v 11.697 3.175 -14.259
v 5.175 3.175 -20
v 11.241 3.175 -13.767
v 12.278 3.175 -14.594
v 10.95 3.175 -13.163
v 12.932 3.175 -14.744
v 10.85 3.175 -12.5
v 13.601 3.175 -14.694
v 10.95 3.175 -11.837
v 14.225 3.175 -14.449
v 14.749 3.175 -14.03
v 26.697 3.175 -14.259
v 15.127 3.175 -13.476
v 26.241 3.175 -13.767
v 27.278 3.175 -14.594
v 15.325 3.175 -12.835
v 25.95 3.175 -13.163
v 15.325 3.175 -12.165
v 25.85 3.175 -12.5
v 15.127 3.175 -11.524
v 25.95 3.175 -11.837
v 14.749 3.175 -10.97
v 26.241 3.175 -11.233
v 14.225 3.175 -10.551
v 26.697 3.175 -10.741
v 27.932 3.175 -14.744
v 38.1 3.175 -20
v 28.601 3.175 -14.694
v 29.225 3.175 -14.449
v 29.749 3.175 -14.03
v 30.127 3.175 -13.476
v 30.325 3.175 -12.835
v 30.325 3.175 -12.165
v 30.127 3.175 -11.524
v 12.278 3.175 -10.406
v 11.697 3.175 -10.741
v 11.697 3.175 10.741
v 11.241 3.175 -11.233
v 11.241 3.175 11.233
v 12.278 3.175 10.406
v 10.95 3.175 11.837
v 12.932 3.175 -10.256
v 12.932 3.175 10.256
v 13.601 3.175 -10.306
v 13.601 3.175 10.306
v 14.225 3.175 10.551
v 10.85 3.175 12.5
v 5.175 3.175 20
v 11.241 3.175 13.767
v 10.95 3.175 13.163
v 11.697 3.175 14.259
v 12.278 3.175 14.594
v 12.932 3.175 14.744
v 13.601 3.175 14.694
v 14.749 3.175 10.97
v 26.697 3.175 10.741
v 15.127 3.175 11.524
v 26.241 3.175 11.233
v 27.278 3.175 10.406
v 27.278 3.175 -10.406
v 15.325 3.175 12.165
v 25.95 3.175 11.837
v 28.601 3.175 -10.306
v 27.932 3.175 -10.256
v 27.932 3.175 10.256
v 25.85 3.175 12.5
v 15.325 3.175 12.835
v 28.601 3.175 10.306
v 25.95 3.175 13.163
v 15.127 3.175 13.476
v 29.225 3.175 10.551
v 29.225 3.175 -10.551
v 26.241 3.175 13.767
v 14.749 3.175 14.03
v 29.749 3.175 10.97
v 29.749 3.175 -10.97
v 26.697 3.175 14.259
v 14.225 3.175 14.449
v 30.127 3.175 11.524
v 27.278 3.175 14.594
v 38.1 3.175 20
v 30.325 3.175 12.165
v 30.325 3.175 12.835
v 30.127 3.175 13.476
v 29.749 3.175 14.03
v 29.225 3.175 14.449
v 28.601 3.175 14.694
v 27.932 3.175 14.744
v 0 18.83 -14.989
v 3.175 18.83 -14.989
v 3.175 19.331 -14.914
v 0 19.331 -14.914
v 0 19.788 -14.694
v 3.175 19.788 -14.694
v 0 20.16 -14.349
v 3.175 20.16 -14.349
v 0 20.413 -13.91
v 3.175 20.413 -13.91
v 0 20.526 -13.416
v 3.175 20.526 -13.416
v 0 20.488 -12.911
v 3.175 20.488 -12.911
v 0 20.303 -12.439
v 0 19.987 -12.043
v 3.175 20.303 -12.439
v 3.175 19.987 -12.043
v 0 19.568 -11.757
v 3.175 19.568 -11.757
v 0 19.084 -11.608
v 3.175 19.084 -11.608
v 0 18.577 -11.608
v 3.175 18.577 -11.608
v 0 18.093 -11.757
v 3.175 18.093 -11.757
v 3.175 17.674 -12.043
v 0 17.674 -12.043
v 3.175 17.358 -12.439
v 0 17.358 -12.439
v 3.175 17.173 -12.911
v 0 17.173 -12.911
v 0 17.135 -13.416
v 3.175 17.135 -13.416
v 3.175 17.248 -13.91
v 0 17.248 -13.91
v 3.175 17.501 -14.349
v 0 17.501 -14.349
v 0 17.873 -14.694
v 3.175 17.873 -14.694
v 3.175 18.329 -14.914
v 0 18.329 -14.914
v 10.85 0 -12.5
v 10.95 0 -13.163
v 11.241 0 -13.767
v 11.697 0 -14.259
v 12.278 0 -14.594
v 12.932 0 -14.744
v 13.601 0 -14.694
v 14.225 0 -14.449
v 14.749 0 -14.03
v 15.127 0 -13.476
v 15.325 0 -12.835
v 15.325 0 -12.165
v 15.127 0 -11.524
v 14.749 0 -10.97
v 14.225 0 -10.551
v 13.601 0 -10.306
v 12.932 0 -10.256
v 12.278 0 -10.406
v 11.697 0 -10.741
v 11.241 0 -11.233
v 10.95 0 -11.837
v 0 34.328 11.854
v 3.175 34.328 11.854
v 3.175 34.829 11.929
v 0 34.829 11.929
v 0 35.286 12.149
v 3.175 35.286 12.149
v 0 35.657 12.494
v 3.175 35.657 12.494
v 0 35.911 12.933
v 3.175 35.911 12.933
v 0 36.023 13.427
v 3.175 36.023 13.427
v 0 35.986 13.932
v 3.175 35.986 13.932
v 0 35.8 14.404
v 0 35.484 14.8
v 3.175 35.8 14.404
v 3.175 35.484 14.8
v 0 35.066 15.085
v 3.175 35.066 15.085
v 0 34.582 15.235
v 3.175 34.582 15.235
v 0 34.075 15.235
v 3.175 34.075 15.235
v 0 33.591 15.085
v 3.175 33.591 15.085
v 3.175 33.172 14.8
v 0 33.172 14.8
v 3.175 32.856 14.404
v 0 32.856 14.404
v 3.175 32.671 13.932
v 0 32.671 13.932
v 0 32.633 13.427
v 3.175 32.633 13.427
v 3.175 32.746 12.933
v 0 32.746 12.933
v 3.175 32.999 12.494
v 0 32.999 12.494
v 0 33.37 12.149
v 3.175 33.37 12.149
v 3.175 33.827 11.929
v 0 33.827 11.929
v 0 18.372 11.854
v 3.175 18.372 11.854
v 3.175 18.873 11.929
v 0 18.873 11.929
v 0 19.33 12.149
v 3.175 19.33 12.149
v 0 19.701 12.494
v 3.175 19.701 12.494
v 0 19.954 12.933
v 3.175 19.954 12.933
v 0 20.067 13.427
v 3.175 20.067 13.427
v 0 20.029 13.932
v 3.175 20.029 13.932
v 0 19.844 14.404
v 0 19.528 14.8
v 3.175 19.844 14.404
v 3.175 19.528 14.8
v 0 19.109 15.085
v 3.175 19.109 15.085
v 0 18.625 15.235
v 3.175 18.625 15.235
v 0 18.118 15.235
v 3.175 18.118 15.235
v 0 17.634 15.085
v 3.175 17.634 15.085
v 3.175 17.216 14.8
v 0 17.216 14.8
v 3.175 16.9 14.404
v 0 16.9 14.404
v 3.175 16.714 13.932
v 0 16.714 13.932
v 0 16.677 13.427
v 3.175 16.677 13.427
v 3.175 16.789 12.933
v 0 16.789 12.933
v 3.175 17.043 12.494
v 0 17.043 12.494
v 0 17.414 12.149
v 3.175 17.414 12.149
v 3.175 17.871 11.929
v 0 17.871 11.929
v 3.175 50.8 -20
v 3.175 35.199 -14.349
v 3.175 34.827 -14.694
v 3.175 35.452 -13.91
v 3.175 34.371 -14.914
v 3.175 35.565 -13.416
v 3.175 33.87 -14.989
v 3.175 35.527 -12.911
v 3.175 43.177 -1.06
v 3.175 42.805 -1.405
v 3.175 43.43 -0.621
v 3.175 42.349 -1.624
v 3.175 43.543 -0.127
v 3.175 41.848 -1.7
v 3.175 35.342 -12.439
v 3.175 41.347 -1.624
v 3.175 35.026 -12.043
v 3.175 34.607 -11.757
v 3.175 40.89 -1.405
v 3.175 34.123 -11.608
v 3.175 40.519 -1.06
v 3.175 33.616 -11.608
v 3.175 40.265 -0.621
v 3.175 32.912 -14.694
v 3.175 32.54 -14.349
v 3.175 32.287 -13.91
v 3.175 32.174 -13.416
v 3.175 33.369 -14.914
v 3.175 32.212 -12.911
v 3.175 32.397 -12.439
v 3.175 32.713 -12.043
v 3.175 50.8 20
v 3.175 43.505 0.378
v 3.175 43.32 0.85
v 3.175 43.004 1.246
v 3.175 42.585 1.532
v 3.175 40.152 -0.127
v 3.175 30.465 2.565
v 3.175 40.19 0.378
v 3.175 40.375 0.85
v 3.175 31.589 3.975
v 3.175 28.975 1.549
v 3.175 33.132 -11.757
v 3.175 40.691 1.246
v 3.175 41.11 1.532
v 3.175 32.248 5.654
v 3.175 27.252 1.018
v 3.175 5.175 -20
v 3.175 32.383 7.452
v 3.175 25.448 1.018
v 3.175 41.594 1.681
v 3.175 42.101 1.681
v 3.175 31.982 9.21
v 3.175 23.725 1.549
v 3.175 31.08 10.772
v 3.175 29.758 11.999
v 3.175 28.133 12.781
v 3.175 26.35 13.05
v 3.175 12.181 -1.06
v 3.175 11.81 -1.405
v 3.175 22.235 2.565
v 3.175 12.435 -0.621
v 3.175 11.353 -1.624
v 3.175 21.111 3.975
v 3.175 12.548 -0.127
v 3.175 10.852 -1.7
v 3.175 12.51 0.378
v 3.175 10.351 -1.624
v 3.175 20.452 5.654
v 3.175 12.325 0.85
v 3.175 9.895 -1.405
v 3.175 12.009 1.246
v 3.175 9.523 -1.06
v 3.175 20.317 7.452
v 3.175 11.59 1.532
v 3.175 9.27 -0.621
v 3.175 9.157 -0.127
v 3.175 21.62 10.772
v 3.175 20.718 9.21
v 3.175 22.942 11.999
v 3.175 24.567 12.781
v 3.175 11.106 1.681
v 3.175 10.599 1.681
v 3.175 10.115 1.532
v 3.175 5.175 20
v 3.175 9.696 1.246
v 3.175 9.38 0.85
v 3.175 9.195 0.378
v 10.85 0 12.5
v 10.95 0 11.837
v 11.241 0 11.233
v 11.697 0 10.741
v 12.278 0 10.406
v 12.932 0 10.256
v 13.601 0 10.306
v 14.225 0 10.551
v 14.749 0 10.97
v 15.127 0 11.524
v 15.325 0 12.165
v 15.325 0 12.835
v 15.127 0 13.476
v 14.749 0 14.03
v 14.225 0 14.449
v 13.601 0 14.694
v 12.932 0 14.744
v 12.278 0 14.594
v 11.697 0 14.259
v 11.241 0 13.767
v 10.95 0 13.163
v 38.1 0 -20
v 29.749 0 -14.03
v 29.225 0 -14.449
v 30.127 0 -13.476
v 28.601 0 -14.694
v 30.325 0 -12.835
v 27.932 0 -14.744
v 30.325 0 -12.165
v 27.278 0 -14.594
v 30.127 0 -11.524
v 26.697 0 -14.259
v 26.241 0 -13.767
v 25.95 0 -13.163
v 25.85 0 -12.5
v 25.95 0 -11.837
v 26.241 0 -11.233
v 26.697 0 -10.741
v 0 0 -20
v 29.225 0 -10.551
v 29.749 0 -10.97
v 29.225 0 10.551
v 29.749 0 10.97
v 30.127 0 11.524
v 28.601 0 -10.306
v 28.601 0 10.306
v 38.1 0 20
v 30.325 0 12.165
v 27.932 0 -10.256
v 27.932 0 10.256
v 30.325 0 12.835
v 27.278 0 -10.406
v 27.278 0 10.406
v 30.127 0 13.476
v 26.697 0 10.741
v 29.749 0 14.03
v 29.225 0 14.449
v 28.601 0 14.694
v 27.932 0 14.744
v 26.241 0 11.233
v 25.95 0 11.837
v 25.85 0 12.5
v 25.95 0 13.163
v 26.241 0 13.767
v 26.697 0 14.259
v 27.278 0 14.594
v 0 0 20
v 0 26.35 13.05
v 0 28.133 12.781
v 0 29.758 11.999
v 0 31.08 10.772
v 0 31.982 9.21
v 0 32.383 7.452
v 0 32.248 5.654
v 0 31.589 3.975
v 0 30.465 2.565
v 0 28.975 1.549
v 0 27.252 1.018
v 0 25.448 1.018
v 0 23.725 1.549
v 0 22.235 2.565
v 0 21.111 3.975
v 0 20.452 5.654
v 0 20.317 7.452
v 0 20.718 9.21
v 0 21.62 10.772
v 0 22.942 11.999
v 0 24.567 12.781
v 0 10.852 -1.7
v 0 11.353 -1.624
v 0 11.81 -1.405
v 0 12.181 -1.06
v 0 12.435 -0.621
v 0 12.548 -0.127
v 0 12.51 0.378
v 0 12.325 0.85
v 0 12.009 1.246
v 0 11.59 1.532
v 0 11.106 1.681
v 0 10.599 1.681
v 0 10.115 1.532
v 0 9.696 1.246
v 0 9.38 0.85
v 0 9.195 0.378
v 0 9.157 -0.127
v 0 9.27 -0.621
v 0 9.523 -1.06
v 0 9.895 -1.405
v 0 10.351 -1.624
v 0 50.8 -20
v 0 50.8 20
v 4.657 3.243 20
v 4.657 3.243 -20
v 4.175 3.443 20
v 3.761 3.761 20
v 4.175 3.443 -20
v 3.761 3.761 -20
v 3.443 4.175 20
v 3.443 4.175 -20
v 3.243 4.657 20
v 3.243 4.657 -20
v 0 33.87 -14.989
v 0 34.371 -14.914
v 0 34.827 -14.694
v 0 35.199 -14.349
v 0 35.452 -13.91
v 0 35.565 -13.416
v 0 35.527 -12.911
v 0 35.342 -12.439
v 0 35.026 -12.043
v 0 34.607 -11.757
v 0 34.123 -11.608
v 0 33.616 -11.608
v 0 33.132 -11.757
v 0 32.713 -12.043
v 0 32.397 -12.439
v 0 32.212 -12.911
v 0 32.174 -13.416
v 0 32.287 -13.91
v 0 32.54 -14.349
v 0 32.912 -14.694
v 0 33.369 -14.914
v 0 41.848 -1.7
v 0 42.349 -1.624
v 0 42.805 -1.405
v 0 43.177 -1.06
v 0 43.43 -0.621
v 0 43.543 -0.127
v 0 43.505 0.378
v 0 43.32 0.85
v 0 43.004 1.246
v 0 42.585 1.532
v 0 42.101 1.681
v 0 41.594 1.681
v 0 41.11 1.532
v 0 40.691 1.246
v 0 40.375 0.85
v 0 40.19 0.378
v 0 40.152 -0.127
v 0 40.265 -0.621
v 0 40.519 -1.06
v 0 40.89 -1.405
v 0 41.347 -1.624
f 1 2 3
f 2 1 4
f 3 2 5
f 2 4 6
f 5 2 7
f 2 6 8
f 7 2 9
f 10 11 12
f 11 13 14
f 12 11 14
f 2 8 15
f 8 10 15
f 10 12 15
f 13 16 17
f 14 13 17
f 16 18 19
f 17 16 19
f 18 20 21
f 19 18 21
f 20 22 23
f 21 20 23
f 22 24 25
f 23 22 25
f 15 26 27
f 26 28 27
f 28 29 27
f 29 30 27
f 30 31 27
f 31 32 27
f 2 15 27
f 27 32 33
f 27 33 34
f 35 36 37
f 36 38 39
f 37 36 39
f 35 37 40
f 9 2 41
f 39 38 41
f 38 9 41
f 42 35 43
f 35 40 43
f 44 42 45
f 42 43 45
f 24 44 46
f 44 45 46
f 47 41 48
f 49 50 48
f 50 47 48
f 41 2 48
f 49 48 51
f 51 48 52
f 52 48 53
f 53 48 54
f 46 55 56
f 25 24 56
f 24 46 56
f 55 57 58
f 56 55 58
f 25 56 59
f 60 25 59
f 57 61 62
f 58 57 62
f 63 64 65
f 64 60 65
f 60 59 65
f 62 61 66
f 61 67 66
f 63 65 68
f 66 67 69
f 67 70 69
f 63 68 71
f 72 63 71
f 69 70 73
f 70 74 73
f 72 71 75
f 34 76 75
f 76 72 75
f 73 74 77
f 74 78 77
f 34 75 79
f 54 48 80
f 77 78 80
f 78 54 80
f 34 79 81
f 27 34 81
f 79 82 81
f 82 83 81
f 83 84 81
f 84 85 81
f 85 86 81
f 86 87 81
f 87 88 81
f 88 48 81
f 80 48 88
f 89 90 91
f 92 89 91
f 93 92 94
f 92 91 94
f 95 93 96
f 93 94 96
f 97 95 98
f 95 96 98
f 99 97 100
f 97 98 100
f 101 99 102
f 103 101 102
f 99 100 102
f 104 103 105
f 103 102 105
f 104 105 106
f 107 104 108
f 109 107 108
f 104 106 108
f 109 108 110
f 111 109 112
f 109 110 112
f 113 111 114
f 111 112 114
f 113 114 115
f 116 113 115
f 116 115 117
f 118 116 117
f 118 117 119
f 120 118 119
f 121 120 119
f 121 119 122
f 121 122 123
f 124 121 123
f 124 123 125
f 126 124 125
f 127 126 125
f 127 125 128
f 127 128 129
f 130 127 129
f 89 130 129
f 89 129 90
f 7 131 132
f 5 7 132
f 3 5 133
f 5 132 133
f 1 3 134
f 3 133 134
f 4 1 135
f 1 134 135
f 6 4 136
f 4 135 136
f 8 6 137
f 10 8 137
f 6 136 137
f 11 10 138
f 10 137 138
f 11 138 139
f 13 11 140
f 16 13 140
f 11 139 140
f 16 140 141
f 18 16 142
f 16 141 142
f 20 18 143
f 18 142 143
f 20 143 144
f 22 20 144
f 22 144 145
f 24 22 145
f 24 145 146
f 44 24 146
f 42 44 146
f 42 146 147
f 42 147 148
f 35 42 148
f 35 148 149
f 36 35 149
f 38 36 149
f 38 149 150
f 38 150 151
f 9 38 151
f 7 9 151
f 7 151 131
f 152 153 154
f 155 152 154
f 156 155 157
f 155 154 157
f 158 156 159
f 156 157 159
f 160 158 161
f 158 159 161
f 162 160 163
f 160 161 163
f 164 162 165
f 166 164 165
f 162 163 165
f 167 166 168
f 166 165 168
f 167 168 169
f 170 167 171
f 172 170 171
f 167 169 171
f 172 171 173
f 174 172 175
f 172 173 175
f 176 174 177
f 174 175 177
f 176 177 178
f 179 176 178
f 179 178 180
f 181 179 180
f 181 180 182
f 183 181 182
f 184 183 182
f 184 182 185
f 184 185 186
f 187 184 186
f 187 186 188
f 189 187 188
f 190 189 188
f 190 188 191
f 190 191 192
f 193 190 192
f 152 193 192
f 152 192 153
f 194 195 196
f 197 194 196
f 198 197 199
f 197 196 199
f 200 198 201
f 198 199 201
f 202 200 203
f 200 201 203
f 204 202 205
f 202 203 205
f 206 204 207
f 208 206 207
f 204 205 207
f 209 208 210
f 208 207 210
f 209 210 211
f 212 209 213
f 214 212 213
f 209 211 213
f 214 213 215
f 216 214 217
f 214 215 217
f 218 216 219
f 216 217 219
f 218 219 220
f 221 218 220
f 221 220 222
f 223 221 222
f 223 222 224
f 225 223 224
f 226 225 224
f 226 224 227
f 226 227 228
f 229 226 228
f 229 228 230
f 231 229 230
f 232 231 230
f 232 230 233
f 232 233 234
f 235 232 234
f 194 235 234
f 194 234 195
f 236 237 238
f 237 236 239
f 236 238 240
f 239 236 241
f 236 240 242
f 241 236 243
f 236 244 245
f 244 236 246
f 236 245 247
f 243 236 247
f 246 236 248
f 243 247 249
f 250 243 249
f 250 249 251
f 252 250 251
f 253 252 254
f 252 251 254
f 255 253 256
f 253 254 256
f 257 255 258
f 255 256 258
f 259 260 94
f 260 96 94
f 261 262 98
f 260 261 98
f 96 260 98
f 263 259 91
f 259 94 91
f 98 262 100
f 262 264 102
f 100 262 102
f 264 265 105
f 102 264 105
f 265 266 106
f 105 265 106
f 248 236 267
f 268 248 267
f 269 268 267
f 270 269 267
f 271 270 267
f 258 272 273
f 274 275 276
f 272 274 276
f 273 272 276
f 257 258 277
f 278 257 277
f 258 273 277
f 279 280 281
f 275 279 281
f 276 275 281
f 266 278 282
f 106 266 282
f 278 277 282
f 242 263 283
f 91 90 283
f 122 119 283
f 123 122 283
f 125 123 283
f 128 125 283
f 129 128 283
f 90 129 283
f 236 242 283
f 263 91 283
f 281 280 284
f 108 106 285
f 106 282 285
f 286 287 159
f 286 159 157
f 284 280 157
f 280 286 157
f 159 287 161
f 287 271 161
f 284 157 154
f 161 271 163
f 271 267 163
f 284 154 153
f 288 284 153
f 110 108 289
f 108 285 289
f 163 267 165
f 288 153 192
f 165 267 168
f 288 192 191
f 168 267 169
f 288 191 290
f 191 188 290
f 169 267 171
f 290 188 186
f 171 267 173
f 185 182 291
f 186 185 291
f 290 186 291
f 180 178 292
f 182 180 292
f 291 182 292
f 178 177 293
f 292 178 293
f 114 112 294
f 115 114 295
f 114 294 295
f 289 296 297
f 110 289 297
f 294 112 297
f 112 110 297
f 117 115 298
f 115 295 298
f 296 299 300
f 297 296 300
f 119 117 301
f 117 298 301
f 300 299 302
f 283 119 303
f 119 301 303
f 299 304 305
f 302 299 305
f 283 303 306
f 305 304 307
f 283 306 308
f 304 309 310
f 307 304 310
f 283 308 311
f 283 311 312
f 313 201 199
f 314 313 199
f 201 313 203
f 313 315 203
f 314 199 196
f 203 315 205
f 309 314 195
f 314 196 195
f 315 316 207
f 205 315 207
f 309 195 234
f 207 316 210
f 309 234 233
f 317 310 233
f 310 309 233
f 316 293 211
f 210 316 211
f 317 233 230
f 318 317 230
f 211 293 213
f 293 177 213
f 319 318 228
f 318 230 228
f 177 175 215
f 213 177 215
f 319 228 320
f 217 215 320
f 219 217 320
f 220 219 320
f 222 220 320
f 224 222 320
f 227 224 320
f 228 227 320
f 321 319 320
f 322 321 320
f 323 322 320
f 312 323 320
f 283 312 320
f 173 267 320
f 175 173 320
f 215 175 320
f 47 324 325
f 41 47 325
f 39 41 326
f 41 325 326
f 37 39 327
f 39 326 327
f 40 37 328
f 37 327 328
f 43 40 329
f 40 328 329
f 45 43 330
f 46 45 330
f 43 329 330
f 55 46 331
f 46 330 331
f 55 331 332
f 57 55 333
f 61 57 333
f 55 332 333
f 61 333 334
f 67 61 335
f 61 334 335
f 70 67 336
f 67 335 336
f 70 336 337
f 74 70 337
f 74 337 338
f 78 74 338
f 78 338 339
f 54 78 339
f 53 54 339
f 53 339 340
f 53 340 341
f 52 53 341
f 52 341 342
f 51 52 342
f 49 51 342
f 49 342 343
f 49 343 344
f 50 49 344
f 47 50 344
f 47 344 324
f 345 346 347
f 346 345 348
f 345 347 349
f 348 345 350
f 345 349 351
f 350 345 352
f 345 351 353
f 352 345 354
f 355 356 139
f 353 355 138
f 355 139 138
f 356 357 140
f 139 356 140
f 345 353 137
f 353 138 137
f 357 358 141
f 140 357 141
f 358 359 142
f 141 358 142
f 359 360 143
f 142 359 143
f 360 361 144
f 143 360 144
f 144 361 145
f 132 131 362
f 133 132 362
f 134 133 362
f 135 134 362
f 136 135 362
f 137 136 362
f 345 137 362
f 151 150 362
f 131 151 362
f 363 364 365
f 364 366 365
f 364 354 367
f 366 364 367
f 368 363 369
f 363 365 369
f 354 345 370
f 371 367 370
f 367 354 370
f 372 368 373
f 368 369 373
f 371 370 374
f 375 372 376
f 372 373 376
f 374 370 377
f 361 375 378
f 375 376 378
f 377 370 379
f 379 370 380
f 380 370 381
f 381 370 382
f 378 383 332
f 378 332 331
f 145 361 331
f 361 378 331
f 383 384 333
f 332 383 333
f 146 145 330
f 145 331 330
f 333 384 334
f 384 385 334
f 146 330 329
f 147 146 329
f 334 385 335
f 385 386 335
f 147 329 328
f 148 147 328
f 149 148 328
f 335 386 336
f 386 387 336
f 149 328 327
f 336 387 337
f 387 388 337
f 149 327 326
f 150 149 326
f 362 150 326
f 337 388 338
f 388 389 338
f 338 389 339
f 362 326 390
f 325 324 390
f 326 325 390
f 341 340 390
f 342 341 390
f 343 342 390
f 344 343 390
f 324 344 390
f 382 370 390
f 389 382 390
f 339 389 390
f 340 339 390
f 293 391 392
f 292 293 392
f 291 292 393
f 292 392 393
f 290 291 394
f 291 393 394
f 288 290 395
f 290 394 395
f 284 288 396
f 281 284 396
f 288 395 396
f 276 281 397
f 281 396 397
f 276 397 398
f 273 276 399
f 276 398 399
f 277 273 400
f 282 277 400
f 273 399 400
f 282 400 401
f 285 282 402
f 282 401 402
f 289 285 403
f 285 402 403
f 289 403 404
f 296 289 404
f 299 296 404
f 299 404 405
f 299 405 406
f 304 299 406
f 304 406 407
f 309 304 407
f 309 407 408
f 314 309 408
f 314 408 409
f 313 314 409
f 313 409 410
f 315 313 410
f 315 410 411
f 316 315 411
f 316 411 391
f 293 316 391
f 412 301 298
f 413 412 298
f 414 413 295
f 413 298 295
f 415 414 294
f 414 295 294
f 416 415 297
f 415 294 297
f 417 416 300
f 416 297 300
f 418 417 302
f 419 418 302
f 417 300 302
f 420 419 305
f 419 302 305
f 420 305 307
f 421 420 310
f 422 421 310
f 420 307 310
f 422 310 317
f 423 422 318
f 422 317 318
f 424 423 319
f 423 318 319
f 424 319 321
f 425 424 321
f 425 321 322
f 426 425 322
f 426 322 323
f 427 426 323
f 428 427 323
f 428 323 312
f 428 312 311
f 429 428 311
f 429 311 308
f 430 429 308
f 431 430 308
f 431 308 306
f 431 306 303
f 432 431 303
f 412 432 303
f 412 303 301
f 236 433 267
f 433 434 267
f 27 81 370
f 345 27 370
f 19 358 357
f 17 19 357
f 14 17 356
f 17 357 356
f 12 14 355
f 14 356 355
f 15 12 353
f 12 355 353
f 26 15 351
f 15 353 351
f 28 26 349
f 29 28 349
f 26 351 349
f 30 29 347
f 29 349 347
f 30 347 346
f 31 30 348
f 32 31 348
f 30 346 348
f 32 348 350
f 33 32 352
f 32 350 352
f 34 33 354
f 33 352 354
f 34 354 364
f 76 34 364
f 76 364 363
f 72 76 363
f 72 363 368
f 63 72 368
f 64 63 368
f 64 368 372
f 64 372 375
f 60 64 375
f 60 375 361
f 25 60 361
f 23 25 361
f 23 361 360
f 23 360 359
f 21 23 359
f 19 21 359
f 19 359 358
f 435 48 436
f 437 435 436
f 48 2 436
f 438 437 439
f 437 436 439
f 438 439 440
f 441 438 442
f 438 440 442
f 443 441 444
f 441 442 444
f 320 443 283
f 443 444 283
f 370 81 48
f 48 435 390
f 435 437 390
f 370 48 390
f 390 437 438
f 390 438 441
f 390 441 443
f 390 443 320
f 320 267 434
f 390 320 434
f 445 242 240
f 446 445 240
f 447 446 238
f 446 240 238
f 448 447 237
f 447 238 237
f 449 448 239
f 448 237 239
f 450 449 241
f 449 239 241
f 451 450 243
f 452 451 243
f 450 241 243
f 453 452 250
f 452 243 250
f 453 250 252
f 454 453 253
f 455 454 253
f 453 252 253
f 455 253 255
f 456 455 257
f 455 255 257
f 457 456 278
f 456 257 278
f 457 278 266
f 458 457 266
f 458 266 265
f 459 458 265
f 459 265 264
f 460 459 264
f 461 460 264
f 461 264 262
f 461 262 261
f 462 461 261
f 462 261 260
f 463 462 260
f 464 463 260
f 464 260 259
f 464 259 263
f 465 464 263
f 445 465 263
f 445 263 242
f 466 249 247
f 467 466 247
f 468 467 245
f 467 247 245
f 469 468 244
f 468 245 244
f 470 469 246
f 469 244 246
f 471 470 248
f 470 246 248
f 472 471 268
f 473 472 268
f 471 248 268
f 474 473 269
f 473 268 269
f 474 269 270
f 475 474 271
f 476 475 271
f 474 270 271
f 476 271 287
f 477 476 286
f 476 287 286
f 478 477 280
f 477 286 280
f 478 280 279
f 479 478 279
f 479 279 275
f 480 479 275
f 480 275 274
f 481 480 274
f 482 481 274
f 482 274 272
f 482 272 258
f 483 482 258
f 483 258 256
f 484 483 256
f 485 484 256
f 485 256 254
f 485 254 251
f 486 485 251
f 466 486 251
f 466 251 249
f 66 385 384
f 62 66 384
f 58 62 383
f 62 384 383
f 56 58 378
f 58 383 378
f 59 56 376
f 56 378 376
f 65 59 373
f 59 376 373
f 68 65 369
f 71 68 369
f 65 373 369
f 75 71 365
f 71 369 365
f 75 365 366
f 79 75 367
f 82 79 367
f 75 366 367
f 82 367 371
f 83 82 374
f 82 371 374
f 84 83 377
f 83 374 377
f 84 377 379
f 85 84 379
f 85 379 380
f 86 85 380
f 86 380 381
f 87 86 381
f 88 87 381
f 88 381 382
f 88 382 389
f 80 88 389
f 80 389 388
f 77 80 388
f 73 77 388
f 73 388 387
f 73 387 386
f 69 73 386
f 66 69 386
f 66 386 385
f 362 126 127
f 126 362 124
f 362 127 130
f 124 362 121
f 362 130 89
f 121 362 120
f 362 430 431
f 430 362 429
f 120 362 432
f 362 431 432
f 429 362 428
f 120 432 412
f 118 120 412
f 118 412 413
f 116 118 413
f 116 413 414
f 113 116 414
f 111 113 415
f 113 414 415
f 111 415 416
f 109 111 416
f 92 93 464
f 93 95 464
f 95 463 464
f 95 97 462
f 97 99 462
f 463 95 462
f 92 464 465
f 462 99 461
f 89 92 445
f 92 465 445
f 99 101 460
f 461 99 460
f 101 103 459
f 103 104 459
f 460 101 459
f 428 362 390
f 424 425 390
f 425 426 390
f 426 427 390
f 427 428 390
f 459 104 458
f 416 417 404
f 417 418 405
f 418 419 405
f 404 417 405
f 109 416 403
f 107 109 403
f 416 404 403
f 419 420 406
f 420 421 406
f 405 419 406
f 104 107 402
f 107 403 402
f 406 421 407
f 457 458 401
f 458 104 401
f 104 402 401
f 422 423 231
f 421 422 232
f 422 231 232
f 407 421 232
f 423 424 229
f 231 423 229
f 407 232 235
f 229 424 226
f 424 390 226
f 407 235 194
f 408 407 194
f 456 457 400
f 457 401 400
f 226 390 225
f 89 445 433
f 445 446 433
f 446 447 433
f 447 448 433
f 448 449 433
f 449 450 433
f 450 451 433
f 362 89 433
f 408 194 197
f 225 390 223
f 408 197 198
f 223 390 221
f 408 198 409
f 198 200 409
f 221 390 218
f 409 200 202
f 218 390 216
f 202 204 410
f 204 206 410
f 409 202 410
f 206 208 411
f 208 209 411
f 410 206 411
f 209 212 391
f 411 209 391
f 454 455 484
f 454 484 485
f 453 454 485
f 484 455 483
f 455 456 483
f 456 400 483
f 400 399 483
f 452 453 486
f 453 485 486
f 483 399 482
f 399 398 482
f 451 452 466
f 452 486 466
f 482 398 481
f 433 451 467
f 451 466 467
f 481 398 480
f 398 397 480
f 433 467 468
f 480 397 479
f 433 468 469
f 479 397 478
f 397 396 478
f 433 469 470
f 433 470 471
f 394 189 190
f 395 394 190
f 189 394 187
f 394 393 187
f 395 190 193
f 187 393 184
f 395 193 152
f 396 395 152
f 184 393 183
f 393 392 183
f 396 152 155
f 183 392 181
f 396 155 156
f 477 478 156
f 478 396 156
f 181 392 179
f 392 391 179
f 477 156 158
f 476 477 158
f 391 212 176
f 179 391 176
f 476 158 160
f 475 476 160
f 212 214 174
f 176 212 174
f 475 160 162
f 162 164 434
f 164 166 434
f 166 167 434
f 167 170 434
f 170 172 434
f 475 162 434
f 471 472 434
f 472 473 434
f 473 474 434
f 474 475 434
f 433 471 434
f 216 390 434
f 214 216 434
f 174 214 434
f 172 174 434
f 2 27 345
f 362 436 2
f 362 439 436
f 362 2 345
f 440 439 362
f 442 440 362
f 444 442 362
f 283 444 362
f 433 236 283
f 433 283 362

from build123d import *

# Parameters (mm, degrees)
BOSS_EXTRUDE1_DEPTH  = 20
FILLET1_R            = 2
M3_CLEARANCE_HOLE1_D = 3.4
SKETCH6_R            = 6.05
CUT_EXTRUDE1_DEPTH   = 39.1
M4_CLEARANCE_HOLE1_D = 4.5


with BuildPart() as part:
    # Sketch1 → Boss-Extrude1 (new body, symmetric)
    with BuildSketch(Plane.XY):
        Polygon((0, 0), (0, 50.8), (3.175, 50.8), (3.175, 3.175), (38.1, 3.175), (38.1, 0), align=None)
    extrude(amount=BOSS_EXTRUDE1_DEPTH, both=True)

    # Fillet1
    fillet1_edges = [part.edges().sort_by_distance(p)[0] for p in [
        (3.175, 3.175, 0),
    ]]
    fillet(fillet1_edges, radius=FILLET1_R)

    # M3 Clearance Hole1 (through all)
    with Locations(Plane.ZY):
        with Locations((0, 41.847738991), (13.553804618, 34.328139243), (-13.289066718, 18.830400251), (0, 10.852261009), (-13.289066718, 33.869599749), (13.553804618, 18.371860757)):
            Hole(M3_CLEARANCE_HOLE1_D / 2)

    # Sketch6 → Cut-Extrude1 (cut, through all)
    with BuildSketch(Plane.ZY):
        with Locations((7, 26.35)):
            Circle(SKETCH6_R)
    extrude(amount=-CUT_EXTRUDE1_DEPTH, mode=Mode.SUBTRACT)

    # M4 Clearance Hole1 (through all)
    with Locations(Plane(origin=(0, 3.175, 0), x_dir=(1, 0, 0), z_dir=(0, 1, 0))):
        with Locations((13.1, -12.5), (28.1, -12.5), (28.1, 12.5), (13.1, 12.5)):
            Hole(M4_CLEARANCE_HOLE1_D / 2)


solid = part.part
